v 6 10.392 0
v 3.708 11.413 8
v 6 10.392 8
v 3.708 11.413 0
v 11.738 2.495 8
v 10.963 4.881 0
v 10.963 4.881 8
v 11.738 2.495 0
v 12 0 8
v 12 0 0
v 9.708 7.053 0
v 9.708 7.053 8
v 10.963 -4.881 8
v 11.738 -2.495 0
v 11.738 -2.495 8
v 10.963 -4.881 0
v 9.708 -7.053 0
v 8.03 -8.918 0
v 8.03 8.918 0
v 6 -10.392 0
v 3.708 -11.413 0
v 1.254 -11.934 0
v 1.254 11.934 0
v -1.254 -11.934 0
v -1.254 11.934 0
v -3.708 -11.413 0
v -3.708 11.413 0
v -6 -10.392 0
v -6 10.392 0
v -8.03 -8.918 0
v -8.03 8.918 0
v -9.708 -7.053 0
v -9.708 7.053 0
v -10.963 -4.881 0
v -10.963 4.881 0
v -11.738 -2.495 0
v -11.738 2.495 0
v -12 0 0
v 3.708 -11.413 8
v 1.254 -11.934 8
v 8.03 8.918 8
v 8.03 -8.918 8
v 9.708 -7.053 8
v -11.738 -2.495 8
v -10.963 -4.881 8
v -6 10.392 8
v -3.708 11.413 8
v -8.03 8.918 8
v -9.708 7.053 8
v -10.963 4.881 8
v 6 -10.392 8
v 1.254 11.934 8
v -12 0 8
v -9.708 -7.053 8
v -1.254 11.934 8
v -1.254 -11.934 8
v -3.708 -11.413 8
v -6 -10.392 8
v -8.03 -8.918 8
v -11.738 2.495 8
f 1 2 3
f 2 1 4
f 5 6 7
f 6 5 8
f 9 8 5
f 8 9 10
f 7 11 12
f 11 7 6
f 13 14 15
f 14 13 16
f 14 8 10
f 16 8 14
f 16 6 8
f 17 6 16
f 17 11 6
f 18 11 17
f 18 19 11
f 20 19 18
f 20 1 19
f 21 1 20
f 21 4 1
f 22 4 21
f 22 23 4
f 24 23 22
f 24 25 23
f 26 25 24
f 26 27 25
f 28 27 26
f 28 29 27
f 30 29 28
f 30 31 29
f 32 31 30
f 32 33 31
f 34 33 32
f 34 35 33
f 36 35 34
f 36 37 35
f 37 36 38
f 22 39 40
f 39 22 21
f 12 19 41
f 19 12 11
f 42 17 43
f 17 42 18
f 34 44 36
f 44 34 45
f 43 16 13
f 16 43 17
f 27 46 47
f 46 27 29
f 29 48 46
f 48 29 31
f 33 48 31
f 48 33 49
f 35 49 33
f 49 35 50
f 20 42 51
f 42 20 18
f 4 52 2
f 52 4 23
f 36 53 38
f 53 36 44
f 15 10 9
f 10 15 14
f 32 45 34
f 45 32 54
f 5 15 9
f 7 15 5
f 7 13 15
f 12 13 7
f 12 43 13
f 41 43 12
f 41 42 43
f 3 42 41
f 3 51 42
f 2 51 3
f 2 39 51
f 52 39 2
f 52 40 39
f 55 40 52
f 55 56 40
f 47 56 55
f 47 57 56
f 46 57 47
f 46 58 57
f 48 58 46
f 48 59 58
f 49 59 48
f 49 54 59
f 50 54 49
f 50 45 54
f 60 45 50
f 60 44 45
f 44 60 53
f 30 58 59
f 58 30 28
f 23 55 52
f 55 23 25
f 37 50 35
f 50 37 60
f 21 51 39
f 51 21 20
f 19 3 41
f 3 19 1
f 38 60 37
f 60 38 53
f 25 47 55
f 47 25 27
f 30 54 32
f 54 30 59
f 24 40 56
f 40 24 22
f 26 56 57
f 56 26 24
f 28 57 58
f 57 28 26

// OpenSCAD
zipHeight = 3;
camHeight = zipHeight+5;

ld=24;

difference() {
    cylinder(d=ld, h=camHeight);
        
    #translate([zipHeight, zipHeight, (camHeight-zipHeight)/2])
        rotate_extrude(angle=15, twist=15) {
        translate([ld/2-zipHeight/2, zipHeight/2]) circle(d=zipHeight, $fn=10);
    }
}
